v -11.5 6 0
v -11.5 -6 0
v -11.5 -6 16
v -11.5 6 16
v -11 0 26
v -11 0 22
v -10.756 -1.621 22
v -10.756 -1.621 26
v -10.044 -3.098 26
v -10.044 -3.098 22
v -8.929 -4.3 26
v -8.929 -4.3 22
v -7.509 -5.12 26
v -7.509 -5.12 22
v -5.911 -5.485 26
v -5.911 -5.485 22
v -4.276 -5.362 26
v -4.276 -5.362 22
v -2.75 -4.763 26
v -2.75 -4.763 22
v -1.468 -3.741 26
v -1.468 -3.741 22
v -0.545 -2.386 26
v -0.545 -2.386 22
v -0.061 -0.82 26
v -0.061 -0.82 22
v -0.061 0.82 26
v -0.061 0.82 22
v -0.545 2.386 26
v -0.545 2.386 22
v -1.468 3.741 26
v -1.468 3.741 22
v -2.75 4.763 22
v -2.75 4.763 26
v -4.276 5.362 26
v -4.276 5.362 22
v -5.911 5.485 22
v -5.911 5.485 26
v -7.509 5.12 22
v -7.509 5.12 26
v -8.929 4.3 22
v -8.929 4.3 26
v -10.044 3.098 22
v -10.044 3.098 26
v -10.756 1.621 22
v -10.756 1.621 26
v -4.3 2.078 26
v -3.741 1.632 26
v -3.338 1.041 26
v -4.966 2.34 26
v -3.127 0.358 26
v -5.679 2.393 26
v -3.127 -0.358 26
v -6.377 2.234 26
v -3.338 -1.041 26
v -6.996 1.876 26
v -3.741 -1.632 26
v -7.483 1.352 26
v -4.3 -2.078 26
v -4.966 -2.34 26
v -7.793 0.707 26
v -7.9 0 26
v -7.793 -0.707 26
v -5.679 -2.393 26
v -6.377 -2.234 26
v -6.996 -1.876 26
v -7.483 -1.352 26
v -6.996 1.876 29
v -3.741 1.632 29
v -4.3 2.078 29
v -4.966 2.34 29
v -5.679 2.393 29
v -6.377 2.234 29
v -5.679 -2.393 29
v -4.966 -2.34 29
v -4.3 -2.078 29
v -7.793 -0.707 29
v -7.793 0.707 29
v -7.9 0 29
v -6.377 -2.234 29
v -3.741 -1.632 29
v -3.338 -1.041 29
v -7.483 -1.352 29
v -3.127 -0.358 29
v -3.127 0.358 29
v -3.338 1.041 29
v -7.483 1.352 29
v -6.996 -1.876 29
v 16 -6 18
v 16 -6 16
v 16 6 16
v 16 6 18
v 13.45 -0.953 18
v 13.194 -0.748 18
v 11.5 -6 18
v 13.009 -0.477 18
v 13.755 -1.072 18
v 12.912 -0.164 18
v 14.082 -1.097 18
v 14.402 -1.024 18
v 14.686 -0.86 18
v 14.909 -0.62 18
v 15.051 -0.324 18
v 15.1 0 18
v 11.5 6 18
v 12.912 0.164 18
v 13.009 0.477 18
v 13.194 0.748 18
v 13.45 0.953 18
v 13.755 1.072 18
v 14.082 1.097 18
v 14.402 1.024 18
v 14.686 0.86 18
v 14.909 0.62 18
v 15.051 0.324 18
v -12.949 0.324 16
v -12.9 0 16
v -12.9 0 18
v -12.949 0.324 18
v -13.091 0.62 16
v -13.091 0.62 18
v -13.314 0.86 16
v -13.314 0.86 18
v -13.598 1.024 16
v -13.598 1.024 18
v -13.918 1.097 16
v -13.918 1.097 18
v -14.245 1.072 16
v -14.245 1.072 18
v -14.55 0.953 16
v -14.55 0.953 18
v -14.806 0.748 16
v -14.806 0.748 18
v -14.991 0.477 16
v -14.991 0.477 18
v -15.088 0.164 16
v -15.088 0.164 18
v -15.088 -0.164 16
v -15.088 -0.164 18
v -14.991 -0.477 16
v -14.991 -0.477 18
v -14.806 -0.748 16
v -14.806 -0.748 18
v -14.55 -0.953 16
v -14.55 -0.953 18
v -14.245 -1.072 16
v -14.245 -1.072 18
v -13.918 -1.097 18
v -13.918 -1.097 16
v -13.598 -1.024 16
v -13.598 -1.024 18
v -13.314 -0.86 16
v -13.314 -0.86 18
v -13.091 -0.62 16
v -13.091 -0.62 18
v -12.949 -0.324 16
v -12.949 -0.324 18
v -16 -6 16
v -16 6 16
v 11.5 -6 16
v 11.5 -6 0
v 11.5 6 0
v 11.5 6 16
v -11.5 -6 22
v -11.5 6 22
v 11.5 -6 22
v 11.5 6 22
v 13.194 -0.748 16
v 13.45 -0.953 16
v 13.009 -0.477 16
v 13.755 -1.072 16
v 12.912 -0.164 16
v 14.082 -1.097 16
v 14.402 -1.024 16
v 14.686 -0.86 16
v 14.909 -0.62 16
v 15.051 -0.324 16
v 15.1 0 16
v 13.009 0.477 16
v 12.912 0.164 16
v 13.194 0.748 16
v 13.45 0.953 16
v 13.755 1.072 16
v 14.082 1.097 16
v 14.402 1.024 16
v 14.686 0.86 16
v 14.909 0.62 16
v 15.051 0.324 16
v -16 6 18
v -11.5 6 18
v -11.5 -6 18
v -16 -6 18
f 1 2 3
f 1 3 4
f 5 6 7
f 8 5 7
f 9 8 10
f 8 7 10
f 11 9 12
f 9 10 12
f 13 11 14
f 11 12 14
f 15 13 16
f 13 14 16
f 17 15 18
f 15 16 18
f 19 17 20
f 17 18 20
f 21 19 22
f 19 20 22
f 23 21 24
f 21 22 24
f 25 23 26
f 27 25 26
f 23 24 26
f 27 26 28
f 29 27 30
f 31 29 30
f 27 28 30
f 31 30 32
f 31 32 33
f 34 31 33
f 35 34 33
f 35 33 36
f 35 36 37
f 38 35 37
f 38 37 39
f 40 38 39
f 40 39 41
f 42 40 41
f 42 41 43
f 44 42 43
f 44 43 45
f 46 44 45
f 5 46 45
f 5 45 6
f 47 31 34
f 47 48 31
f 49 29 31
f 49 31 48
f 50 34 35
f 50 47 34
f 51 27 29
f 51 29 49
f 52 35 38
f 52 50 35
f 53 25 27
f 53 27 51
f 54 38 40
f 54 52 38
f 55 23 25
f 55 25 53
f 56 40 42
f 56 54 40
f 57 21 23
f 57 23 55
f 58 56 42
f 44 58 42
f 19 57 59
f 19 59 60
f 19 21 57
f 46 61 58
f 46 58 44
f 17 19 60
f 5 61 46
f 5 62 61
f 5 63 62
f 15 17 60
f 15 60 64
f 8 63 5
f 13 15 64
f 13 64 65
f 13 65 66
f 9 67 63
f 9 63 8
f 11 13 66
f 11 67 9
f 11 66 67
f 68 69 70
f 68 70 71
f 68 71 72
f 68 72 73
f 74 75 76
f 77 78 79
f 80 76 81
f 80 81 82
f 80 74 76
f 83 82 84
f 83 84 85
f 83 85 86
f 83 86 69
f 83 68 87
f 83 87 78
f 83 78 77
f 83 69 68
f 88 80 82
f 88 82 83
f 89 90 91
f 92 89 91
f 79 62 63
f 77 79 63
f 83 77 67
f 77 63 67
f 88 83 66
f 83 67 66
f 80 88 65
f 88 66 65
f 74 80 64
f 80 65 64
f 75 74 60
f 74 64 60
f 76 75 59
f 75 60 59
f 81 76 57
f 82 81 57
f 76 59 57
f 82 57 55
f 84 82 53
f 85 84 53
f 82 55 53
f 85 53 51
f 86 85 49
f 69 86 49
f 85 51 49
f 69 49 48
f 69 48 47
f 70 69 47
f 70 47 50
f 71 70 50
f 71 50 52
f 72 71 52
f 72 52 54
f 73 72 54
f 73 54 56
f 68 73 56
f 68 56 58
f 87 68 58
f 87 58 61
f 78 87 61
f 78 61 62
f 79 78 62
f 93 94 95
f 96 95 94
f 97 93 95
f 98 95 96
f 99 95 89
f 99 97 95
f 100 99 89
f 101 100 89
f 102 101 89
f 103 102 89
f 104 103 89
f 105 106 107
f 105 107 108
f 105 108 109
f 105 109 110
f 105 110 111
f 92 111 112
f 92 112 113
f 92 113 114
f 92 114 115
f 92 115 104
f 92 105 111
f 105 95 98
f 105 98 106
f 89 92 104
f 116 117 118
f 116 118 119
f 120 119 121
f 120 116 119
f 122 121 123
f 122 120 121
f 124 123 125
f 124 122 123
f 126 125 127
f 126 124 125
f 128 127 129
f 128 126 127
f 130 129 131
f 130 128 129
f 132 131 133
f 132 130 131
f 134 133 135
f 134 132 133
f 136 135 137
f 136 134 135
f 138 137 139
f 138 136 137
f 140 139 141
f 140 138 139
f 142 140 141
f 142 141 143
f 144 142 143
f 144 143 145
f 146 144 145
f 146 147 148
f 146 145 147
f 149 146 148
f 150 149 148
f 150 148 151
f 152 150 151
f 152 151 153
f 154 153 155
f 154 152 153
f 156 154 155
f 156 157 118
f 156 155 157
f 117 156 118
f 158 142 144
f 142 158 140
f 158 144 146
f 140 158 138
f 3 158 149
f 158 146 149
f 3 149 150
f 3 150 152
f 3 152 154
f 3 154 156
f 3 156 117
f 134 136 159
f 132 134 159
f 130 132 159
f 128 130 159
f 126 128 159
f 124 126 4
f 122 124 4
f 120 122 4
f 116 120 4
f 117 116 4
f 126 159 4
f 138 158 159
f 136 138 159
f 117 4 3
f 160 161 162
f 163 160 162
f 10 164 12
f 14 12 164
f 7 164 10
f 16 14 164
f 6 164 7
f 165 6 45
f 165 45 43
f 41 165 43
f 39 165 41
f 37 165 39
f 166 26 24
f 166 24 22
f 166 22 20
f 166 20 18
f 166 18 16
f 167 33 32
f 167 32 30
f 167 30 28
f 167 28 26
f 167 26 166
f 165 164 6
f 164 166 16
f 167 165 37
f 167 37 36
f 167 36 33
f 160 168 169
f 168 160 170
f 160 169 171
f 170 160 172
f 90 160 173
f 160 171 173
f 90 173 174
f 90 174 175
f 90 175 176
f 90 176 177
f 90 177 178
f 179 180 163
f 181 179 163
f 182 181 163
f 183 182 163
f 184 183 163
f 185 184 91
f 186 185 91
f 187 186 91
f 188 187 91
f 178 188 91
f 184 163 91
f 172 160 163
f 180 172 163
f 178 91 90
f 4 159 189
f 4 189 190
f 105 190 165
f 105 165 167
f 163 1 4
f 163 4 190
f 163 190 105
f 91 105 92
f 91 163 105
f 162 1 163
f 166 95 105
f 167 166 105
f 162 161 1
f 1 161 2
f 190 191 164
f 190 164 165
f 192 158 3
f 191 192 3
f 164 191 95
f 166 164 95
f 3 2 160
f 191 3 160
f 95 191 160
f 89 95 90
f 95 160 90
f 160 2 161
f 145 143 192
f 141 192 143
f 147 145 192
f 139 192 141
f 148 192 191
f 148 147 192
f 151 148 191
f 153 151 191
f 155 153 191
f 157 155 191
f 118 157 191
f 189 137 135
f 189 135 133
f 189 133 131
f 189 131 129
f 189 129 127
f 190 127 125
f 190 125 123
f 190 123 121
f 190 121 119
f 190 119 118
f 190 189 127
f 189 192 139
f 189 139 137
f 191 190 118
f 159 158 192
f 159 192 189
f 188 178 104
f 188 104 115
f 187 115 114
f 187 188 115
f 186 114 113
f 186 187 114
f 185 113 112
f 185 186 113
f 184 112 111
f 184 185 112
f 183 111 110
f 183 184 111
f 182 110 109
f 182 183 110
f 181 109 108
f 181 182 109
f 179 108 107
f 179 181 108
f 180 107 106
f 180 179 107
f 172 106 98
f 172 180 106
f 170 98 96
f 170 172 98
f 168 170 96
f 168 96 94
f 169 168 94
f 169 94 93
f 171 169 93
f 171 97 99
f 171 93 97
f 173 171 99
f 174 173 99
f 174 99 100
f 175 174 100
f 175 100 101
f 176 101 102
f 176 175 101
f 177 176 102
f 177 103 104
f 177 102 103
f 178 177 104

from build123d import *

# Parameters (mm, degrees)
SKETCH_1_W                            = 23
SKETCH_1_H                            = 12
SG90_CASE_PHOTO_APPROX23X12X22_DEPTH  = 22
SG90_EARS_APPROX32_START              = 16
SKETCH_2_W                            = 32
SKETCH_2_H                            = 12
SG90_EARS_APPROX32_DEPTH              = 2
SKETCH_3_R                            = 5.5
SG90_TOP_BOSS_APPROX_DEPTH            = 26
SKETCH_4_R                            = 2.4
SG90_SHAFT_ENVELOPE_NO_SPLINE_DEPTH   = 29
SG90_EAR_HOLES_REFERENCE28_DEPTH      = 34.660065359
SG90_EAR_HOLES_REFERENCE28_DEPTH_BACK = 34.660065359
SKETCH_5_R                            = 1.1


with BuildPart() as part:
    # 草图1 → SG90_case_PHOTO_APPROX23x12x22 (new body)
    with BuildSketch(Plane.XY):
        Rectangle(SKETCH_1_W, SKETCH_1_H)
    extrude(amount=SG90_CASE_PHOTO_APPROX23X12X22_DEPTH)

    # 草图2 → SG90_ears_APPROX32 (add)
    with BuildSketch(Plane.XY.offset(SG90_EARS_APPROX32_START)):
        Rectangle(SKETCH_2_W, SKETCH_2_H)
    extrude(amount=SG90_EARS_APPROX32_DEPTH)

    # 草图3 → SG90_top_boss_APPROX (add)
    with BuildSketch(Plane.XY):
        with Locations(Location((-5.5, 0, 0), (0, 0, 180))):
            Circle(SKETCH_3_R)
    extrude(amount=SG90_TOP_BOSS_APPROX_DEPTH)

    # 草图4 → SG90_shaft_envelope_NO_SPLINE (add)
    with BuildSketch(Plane.XY):
        with Locations(Location((-5.5, 0, 0), (0, 0, 180))):
            Circle(SKETCH_4_R)
    extrude(amount=SG90_SHAFT_ENVELOPE_NO_SPLINE_DEPTH)

    # 草图5 → SG90_ear_holes_REFERENCE28 (cut, two sides: drawn at the far end of the back side and taken through both)
    with BuildSketch(Plane.XY.offset(-SG90_EAR_HOLES_REFERENCE28_DEPTH_BACK)):
        with Locations((-14, 0)):
            Circle(SKETCH_5_R)
        with Locations((14, 0)):
            Circle(SKETCH_5_R)
    extrude(amount=SG90_EAR_HOLES_REFERENCE28_DEPTH + SG90_EAR_HOLES_REFERENCE28_DEPTH_BACK, mode=Mode.SUBTRACT)


solid = part.part
